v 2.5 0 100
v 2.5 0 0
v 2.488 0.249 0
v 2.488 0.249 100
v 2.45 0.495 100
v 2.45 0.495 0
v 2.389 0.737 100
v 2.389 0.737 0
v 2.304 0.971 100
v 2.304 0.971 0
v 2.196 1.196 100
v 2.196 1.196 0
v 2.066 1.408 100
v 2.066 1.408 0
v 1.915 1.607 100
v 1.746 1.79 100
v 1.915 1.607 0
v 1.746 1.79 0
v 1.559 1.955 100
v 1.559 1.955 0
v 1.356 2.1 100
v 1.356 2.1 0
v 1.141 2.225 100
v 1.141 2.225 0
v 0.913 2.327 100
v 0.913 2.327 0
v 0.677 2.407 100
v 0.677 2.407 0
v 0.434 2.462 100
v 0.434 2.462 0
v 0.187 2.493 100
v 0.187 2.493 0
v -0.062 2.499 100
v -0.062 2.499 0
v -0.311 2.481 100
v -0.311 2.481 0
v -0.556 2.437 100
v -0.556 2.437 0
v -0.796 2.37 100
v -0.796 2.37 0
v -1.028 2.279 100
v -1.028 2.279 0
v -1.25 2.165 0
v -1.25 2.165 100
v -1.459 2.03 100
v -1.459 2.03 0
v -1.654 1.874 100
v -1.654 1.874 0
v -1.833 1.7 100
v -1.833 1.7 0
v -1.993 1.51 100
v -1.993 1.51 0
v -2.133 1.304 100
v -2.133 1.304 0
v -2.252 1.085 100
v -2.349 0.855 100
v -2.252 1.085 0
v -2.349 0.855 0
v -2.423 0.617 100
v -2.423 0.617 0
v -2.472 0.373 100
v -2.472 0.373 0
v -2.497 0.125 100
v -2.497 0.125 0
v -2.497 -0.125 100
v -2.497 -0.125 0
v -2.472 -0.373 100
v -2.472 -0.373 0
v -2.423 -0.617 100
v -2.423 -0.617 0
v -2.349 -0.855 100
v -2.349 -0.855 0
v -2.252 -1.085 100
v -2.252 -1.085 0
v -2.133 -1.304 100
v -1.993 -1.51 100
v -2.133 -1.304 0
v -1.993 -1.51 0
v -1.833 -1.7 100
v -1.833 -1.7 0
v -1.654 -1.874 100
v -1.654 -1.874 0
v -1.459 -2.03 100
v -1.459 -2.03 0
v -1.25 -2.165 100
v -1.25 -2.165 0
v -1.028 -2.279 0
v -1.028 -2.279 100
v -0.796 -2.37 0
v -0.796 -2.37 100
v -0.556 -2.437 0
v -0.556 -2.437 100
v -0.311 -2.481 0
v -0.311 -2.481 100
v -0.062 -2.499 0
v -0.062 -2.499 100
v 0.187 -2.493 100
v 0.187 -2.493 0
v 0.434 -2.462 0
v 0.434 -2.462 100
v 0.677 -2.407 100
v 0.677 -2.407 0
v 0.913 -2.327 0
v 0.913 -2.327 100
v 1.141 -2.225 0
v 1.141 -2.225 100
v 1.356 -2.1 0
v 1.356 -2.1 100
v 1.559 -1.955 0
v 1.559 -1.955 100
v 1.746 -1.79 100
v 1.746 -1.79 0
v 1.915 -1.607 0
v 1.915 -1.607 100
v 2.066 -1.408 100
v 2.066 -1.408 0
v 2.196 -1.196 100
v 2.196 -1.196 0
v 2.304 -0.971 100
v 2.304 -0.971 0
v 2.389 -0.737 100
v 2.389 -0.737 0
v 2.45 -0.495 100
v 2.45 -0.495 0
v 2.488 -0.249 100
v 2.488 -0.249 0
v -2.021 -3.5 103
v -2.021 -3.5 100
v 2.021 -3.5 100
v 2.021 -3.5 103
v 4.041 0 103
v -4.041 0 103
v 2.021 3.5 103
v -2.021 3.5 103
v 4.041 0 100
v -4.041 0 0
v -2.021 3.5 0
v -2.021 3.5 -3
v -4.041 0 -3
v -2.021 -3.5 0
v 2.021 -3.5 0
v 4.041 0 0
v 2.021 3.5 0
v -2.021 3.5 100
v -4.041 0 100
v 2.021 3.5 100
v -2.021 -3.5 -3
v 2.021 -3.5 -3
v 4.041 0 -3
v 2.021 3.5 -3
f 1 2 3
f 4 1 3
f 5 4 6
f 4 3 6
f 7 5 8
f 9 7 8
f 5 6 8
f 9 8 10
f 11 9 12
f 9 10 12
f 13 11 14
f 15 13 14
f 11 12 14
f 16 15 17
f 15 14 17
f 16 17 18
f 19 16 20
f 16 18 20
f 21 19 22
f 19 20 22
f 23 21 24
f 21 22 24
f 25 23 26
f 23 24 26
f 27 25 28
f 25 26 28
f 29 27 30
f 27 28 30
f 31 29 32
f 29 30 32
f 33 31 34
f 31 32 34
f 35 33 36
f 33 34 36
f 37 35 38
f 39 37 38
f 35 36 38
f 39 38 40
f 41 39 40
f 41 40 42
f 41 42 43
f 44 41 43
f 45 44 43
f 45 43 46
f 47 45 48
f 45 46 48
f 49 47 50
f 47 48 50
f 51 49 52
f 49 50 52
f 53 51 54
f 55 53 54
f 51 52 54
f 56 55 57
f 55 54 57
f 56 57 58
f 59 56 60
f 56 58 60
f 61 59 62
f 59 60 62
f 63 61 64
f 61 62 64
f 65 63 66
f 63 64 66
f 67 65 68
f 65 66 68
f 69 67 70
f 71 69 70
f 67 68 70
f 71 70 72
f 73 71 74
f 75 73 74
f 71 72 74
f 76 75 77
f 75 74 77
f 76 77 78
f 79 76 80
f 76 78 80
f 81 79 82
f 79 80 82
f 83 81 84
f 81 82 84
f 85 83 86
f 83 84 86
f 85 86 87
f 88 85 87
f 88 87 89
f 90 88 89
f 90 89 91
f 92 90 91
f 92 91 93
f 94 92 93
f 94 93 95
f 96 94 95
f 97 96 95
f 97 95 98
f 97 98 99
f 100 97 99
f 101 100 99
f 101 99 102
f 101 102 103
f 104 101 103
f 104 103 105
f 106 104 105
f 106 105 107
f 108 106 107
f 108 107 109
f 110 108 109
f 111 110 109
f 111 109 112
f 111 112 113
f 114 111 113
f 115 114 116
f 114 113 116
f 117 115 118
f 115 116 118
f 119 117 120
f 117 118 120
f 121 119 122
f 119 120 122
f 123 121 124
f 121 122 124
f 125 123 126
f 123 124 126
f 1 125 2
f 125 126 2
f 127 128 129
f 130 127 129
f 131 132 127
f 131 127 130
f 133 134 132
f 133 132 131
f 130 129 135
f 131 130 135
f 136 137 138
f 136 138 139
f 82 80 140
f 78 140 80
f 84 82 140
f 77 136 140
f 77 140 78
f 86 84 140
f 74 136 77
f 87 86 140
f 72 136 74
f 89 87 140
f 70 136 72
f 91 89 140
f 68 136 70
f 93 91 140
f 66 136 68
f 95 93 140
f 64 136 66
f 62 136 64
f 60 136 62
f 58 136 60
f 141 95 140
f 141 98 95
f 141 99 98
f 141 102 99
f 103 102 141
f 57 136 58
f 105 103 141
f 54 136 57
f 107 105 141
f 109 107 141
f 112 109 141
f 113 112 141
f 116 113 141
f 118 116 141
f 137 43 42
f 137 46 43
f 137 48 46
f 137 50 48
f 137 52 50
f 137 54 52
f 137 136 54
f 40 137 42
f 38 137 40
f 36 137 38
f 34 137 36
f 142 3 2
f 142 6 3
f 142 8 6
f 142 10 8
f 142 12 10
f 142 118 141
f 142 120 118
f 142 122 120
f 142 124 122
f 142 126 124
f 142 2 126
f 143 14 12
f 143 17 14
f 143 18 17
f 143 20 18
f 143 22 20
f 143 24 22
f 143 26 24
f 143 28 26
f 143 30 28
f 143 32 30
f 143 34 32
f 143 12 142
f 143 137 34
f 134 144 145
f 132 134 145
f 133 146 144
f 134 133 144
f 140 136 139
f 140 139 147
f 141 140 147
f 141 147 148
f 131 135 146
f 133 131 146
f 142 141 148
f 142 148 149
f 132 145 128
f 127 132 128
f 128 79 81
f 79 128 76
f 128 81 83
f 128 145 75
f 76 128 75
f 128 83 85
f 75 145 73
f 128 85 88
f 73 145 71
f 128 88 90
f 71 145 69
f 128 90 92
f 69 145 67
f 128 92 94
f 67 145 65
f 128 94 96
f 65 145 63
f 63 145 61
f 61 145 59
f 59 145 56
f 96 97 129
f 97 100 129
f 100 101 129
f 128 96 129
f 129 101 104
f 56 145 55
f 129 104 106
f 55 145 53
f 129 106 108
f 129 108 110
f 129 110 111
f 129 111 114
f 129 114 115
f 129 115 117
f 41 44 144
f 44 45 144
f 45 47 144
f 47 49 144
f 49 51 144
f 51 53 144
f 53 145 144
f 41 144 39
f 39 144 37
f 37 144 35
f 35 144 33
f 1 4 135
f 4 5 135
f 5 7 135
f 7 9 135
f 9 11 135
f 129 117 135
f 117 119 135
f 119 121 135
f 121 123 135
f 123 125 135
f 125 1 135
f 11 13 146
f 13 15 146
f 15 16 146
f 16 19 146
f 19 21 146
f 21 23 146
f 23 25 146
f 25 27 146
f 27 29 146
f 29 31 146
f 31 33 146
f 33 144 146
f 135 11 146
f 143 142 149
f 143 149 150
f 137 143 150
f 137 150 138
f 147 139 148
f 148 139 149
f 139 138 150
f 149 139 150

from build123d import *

# Parameters (mm, degrees)
SKETCH_1_R      = 2.5
EXTRUDE_1_DEPTH = 100
EXTRUDE_2_DEPTH = 3
EXTRUDE_START   = 100
EXTRUDE_3_DEPTH = 3


with BuildPart() as part:
    # 草圖1 → 填料-伸長1 (new body)
    with BuildSketch(Plane.XY):
        Circle(SKETCH_1_R)
    extrude(amount=EXTRUDE_1_DEPTH)

    # 草圖3 → 填料-伸長2 (add)
    with BuildSketch(Plane.XY):
        Polygon((2.020725942, 3.5), (-2.020725942, 3.5), (-4.041451884, 0), (-2.020725942, -3.5), (2.020725942, -3.5), (4.041451884, 0), align=None)
    extrude(amount=-EXTRUDE_2_DEPTH)

    # 草圖4 → 填料-伸長3 (add)
    with BuildSketch(Plane.XY.offset(EXTRUDE_START)):
        Polygon((-4.041451884, 0), (-2.020725942, -3.5), (2.020725942, -3.5), (4.041451884, 0), (2.020725942, 3.5), (-2.020725942, 3.5), align=None)
    extrude(amount=EXTRUDE_3_DEPTH)


solid = part.part
